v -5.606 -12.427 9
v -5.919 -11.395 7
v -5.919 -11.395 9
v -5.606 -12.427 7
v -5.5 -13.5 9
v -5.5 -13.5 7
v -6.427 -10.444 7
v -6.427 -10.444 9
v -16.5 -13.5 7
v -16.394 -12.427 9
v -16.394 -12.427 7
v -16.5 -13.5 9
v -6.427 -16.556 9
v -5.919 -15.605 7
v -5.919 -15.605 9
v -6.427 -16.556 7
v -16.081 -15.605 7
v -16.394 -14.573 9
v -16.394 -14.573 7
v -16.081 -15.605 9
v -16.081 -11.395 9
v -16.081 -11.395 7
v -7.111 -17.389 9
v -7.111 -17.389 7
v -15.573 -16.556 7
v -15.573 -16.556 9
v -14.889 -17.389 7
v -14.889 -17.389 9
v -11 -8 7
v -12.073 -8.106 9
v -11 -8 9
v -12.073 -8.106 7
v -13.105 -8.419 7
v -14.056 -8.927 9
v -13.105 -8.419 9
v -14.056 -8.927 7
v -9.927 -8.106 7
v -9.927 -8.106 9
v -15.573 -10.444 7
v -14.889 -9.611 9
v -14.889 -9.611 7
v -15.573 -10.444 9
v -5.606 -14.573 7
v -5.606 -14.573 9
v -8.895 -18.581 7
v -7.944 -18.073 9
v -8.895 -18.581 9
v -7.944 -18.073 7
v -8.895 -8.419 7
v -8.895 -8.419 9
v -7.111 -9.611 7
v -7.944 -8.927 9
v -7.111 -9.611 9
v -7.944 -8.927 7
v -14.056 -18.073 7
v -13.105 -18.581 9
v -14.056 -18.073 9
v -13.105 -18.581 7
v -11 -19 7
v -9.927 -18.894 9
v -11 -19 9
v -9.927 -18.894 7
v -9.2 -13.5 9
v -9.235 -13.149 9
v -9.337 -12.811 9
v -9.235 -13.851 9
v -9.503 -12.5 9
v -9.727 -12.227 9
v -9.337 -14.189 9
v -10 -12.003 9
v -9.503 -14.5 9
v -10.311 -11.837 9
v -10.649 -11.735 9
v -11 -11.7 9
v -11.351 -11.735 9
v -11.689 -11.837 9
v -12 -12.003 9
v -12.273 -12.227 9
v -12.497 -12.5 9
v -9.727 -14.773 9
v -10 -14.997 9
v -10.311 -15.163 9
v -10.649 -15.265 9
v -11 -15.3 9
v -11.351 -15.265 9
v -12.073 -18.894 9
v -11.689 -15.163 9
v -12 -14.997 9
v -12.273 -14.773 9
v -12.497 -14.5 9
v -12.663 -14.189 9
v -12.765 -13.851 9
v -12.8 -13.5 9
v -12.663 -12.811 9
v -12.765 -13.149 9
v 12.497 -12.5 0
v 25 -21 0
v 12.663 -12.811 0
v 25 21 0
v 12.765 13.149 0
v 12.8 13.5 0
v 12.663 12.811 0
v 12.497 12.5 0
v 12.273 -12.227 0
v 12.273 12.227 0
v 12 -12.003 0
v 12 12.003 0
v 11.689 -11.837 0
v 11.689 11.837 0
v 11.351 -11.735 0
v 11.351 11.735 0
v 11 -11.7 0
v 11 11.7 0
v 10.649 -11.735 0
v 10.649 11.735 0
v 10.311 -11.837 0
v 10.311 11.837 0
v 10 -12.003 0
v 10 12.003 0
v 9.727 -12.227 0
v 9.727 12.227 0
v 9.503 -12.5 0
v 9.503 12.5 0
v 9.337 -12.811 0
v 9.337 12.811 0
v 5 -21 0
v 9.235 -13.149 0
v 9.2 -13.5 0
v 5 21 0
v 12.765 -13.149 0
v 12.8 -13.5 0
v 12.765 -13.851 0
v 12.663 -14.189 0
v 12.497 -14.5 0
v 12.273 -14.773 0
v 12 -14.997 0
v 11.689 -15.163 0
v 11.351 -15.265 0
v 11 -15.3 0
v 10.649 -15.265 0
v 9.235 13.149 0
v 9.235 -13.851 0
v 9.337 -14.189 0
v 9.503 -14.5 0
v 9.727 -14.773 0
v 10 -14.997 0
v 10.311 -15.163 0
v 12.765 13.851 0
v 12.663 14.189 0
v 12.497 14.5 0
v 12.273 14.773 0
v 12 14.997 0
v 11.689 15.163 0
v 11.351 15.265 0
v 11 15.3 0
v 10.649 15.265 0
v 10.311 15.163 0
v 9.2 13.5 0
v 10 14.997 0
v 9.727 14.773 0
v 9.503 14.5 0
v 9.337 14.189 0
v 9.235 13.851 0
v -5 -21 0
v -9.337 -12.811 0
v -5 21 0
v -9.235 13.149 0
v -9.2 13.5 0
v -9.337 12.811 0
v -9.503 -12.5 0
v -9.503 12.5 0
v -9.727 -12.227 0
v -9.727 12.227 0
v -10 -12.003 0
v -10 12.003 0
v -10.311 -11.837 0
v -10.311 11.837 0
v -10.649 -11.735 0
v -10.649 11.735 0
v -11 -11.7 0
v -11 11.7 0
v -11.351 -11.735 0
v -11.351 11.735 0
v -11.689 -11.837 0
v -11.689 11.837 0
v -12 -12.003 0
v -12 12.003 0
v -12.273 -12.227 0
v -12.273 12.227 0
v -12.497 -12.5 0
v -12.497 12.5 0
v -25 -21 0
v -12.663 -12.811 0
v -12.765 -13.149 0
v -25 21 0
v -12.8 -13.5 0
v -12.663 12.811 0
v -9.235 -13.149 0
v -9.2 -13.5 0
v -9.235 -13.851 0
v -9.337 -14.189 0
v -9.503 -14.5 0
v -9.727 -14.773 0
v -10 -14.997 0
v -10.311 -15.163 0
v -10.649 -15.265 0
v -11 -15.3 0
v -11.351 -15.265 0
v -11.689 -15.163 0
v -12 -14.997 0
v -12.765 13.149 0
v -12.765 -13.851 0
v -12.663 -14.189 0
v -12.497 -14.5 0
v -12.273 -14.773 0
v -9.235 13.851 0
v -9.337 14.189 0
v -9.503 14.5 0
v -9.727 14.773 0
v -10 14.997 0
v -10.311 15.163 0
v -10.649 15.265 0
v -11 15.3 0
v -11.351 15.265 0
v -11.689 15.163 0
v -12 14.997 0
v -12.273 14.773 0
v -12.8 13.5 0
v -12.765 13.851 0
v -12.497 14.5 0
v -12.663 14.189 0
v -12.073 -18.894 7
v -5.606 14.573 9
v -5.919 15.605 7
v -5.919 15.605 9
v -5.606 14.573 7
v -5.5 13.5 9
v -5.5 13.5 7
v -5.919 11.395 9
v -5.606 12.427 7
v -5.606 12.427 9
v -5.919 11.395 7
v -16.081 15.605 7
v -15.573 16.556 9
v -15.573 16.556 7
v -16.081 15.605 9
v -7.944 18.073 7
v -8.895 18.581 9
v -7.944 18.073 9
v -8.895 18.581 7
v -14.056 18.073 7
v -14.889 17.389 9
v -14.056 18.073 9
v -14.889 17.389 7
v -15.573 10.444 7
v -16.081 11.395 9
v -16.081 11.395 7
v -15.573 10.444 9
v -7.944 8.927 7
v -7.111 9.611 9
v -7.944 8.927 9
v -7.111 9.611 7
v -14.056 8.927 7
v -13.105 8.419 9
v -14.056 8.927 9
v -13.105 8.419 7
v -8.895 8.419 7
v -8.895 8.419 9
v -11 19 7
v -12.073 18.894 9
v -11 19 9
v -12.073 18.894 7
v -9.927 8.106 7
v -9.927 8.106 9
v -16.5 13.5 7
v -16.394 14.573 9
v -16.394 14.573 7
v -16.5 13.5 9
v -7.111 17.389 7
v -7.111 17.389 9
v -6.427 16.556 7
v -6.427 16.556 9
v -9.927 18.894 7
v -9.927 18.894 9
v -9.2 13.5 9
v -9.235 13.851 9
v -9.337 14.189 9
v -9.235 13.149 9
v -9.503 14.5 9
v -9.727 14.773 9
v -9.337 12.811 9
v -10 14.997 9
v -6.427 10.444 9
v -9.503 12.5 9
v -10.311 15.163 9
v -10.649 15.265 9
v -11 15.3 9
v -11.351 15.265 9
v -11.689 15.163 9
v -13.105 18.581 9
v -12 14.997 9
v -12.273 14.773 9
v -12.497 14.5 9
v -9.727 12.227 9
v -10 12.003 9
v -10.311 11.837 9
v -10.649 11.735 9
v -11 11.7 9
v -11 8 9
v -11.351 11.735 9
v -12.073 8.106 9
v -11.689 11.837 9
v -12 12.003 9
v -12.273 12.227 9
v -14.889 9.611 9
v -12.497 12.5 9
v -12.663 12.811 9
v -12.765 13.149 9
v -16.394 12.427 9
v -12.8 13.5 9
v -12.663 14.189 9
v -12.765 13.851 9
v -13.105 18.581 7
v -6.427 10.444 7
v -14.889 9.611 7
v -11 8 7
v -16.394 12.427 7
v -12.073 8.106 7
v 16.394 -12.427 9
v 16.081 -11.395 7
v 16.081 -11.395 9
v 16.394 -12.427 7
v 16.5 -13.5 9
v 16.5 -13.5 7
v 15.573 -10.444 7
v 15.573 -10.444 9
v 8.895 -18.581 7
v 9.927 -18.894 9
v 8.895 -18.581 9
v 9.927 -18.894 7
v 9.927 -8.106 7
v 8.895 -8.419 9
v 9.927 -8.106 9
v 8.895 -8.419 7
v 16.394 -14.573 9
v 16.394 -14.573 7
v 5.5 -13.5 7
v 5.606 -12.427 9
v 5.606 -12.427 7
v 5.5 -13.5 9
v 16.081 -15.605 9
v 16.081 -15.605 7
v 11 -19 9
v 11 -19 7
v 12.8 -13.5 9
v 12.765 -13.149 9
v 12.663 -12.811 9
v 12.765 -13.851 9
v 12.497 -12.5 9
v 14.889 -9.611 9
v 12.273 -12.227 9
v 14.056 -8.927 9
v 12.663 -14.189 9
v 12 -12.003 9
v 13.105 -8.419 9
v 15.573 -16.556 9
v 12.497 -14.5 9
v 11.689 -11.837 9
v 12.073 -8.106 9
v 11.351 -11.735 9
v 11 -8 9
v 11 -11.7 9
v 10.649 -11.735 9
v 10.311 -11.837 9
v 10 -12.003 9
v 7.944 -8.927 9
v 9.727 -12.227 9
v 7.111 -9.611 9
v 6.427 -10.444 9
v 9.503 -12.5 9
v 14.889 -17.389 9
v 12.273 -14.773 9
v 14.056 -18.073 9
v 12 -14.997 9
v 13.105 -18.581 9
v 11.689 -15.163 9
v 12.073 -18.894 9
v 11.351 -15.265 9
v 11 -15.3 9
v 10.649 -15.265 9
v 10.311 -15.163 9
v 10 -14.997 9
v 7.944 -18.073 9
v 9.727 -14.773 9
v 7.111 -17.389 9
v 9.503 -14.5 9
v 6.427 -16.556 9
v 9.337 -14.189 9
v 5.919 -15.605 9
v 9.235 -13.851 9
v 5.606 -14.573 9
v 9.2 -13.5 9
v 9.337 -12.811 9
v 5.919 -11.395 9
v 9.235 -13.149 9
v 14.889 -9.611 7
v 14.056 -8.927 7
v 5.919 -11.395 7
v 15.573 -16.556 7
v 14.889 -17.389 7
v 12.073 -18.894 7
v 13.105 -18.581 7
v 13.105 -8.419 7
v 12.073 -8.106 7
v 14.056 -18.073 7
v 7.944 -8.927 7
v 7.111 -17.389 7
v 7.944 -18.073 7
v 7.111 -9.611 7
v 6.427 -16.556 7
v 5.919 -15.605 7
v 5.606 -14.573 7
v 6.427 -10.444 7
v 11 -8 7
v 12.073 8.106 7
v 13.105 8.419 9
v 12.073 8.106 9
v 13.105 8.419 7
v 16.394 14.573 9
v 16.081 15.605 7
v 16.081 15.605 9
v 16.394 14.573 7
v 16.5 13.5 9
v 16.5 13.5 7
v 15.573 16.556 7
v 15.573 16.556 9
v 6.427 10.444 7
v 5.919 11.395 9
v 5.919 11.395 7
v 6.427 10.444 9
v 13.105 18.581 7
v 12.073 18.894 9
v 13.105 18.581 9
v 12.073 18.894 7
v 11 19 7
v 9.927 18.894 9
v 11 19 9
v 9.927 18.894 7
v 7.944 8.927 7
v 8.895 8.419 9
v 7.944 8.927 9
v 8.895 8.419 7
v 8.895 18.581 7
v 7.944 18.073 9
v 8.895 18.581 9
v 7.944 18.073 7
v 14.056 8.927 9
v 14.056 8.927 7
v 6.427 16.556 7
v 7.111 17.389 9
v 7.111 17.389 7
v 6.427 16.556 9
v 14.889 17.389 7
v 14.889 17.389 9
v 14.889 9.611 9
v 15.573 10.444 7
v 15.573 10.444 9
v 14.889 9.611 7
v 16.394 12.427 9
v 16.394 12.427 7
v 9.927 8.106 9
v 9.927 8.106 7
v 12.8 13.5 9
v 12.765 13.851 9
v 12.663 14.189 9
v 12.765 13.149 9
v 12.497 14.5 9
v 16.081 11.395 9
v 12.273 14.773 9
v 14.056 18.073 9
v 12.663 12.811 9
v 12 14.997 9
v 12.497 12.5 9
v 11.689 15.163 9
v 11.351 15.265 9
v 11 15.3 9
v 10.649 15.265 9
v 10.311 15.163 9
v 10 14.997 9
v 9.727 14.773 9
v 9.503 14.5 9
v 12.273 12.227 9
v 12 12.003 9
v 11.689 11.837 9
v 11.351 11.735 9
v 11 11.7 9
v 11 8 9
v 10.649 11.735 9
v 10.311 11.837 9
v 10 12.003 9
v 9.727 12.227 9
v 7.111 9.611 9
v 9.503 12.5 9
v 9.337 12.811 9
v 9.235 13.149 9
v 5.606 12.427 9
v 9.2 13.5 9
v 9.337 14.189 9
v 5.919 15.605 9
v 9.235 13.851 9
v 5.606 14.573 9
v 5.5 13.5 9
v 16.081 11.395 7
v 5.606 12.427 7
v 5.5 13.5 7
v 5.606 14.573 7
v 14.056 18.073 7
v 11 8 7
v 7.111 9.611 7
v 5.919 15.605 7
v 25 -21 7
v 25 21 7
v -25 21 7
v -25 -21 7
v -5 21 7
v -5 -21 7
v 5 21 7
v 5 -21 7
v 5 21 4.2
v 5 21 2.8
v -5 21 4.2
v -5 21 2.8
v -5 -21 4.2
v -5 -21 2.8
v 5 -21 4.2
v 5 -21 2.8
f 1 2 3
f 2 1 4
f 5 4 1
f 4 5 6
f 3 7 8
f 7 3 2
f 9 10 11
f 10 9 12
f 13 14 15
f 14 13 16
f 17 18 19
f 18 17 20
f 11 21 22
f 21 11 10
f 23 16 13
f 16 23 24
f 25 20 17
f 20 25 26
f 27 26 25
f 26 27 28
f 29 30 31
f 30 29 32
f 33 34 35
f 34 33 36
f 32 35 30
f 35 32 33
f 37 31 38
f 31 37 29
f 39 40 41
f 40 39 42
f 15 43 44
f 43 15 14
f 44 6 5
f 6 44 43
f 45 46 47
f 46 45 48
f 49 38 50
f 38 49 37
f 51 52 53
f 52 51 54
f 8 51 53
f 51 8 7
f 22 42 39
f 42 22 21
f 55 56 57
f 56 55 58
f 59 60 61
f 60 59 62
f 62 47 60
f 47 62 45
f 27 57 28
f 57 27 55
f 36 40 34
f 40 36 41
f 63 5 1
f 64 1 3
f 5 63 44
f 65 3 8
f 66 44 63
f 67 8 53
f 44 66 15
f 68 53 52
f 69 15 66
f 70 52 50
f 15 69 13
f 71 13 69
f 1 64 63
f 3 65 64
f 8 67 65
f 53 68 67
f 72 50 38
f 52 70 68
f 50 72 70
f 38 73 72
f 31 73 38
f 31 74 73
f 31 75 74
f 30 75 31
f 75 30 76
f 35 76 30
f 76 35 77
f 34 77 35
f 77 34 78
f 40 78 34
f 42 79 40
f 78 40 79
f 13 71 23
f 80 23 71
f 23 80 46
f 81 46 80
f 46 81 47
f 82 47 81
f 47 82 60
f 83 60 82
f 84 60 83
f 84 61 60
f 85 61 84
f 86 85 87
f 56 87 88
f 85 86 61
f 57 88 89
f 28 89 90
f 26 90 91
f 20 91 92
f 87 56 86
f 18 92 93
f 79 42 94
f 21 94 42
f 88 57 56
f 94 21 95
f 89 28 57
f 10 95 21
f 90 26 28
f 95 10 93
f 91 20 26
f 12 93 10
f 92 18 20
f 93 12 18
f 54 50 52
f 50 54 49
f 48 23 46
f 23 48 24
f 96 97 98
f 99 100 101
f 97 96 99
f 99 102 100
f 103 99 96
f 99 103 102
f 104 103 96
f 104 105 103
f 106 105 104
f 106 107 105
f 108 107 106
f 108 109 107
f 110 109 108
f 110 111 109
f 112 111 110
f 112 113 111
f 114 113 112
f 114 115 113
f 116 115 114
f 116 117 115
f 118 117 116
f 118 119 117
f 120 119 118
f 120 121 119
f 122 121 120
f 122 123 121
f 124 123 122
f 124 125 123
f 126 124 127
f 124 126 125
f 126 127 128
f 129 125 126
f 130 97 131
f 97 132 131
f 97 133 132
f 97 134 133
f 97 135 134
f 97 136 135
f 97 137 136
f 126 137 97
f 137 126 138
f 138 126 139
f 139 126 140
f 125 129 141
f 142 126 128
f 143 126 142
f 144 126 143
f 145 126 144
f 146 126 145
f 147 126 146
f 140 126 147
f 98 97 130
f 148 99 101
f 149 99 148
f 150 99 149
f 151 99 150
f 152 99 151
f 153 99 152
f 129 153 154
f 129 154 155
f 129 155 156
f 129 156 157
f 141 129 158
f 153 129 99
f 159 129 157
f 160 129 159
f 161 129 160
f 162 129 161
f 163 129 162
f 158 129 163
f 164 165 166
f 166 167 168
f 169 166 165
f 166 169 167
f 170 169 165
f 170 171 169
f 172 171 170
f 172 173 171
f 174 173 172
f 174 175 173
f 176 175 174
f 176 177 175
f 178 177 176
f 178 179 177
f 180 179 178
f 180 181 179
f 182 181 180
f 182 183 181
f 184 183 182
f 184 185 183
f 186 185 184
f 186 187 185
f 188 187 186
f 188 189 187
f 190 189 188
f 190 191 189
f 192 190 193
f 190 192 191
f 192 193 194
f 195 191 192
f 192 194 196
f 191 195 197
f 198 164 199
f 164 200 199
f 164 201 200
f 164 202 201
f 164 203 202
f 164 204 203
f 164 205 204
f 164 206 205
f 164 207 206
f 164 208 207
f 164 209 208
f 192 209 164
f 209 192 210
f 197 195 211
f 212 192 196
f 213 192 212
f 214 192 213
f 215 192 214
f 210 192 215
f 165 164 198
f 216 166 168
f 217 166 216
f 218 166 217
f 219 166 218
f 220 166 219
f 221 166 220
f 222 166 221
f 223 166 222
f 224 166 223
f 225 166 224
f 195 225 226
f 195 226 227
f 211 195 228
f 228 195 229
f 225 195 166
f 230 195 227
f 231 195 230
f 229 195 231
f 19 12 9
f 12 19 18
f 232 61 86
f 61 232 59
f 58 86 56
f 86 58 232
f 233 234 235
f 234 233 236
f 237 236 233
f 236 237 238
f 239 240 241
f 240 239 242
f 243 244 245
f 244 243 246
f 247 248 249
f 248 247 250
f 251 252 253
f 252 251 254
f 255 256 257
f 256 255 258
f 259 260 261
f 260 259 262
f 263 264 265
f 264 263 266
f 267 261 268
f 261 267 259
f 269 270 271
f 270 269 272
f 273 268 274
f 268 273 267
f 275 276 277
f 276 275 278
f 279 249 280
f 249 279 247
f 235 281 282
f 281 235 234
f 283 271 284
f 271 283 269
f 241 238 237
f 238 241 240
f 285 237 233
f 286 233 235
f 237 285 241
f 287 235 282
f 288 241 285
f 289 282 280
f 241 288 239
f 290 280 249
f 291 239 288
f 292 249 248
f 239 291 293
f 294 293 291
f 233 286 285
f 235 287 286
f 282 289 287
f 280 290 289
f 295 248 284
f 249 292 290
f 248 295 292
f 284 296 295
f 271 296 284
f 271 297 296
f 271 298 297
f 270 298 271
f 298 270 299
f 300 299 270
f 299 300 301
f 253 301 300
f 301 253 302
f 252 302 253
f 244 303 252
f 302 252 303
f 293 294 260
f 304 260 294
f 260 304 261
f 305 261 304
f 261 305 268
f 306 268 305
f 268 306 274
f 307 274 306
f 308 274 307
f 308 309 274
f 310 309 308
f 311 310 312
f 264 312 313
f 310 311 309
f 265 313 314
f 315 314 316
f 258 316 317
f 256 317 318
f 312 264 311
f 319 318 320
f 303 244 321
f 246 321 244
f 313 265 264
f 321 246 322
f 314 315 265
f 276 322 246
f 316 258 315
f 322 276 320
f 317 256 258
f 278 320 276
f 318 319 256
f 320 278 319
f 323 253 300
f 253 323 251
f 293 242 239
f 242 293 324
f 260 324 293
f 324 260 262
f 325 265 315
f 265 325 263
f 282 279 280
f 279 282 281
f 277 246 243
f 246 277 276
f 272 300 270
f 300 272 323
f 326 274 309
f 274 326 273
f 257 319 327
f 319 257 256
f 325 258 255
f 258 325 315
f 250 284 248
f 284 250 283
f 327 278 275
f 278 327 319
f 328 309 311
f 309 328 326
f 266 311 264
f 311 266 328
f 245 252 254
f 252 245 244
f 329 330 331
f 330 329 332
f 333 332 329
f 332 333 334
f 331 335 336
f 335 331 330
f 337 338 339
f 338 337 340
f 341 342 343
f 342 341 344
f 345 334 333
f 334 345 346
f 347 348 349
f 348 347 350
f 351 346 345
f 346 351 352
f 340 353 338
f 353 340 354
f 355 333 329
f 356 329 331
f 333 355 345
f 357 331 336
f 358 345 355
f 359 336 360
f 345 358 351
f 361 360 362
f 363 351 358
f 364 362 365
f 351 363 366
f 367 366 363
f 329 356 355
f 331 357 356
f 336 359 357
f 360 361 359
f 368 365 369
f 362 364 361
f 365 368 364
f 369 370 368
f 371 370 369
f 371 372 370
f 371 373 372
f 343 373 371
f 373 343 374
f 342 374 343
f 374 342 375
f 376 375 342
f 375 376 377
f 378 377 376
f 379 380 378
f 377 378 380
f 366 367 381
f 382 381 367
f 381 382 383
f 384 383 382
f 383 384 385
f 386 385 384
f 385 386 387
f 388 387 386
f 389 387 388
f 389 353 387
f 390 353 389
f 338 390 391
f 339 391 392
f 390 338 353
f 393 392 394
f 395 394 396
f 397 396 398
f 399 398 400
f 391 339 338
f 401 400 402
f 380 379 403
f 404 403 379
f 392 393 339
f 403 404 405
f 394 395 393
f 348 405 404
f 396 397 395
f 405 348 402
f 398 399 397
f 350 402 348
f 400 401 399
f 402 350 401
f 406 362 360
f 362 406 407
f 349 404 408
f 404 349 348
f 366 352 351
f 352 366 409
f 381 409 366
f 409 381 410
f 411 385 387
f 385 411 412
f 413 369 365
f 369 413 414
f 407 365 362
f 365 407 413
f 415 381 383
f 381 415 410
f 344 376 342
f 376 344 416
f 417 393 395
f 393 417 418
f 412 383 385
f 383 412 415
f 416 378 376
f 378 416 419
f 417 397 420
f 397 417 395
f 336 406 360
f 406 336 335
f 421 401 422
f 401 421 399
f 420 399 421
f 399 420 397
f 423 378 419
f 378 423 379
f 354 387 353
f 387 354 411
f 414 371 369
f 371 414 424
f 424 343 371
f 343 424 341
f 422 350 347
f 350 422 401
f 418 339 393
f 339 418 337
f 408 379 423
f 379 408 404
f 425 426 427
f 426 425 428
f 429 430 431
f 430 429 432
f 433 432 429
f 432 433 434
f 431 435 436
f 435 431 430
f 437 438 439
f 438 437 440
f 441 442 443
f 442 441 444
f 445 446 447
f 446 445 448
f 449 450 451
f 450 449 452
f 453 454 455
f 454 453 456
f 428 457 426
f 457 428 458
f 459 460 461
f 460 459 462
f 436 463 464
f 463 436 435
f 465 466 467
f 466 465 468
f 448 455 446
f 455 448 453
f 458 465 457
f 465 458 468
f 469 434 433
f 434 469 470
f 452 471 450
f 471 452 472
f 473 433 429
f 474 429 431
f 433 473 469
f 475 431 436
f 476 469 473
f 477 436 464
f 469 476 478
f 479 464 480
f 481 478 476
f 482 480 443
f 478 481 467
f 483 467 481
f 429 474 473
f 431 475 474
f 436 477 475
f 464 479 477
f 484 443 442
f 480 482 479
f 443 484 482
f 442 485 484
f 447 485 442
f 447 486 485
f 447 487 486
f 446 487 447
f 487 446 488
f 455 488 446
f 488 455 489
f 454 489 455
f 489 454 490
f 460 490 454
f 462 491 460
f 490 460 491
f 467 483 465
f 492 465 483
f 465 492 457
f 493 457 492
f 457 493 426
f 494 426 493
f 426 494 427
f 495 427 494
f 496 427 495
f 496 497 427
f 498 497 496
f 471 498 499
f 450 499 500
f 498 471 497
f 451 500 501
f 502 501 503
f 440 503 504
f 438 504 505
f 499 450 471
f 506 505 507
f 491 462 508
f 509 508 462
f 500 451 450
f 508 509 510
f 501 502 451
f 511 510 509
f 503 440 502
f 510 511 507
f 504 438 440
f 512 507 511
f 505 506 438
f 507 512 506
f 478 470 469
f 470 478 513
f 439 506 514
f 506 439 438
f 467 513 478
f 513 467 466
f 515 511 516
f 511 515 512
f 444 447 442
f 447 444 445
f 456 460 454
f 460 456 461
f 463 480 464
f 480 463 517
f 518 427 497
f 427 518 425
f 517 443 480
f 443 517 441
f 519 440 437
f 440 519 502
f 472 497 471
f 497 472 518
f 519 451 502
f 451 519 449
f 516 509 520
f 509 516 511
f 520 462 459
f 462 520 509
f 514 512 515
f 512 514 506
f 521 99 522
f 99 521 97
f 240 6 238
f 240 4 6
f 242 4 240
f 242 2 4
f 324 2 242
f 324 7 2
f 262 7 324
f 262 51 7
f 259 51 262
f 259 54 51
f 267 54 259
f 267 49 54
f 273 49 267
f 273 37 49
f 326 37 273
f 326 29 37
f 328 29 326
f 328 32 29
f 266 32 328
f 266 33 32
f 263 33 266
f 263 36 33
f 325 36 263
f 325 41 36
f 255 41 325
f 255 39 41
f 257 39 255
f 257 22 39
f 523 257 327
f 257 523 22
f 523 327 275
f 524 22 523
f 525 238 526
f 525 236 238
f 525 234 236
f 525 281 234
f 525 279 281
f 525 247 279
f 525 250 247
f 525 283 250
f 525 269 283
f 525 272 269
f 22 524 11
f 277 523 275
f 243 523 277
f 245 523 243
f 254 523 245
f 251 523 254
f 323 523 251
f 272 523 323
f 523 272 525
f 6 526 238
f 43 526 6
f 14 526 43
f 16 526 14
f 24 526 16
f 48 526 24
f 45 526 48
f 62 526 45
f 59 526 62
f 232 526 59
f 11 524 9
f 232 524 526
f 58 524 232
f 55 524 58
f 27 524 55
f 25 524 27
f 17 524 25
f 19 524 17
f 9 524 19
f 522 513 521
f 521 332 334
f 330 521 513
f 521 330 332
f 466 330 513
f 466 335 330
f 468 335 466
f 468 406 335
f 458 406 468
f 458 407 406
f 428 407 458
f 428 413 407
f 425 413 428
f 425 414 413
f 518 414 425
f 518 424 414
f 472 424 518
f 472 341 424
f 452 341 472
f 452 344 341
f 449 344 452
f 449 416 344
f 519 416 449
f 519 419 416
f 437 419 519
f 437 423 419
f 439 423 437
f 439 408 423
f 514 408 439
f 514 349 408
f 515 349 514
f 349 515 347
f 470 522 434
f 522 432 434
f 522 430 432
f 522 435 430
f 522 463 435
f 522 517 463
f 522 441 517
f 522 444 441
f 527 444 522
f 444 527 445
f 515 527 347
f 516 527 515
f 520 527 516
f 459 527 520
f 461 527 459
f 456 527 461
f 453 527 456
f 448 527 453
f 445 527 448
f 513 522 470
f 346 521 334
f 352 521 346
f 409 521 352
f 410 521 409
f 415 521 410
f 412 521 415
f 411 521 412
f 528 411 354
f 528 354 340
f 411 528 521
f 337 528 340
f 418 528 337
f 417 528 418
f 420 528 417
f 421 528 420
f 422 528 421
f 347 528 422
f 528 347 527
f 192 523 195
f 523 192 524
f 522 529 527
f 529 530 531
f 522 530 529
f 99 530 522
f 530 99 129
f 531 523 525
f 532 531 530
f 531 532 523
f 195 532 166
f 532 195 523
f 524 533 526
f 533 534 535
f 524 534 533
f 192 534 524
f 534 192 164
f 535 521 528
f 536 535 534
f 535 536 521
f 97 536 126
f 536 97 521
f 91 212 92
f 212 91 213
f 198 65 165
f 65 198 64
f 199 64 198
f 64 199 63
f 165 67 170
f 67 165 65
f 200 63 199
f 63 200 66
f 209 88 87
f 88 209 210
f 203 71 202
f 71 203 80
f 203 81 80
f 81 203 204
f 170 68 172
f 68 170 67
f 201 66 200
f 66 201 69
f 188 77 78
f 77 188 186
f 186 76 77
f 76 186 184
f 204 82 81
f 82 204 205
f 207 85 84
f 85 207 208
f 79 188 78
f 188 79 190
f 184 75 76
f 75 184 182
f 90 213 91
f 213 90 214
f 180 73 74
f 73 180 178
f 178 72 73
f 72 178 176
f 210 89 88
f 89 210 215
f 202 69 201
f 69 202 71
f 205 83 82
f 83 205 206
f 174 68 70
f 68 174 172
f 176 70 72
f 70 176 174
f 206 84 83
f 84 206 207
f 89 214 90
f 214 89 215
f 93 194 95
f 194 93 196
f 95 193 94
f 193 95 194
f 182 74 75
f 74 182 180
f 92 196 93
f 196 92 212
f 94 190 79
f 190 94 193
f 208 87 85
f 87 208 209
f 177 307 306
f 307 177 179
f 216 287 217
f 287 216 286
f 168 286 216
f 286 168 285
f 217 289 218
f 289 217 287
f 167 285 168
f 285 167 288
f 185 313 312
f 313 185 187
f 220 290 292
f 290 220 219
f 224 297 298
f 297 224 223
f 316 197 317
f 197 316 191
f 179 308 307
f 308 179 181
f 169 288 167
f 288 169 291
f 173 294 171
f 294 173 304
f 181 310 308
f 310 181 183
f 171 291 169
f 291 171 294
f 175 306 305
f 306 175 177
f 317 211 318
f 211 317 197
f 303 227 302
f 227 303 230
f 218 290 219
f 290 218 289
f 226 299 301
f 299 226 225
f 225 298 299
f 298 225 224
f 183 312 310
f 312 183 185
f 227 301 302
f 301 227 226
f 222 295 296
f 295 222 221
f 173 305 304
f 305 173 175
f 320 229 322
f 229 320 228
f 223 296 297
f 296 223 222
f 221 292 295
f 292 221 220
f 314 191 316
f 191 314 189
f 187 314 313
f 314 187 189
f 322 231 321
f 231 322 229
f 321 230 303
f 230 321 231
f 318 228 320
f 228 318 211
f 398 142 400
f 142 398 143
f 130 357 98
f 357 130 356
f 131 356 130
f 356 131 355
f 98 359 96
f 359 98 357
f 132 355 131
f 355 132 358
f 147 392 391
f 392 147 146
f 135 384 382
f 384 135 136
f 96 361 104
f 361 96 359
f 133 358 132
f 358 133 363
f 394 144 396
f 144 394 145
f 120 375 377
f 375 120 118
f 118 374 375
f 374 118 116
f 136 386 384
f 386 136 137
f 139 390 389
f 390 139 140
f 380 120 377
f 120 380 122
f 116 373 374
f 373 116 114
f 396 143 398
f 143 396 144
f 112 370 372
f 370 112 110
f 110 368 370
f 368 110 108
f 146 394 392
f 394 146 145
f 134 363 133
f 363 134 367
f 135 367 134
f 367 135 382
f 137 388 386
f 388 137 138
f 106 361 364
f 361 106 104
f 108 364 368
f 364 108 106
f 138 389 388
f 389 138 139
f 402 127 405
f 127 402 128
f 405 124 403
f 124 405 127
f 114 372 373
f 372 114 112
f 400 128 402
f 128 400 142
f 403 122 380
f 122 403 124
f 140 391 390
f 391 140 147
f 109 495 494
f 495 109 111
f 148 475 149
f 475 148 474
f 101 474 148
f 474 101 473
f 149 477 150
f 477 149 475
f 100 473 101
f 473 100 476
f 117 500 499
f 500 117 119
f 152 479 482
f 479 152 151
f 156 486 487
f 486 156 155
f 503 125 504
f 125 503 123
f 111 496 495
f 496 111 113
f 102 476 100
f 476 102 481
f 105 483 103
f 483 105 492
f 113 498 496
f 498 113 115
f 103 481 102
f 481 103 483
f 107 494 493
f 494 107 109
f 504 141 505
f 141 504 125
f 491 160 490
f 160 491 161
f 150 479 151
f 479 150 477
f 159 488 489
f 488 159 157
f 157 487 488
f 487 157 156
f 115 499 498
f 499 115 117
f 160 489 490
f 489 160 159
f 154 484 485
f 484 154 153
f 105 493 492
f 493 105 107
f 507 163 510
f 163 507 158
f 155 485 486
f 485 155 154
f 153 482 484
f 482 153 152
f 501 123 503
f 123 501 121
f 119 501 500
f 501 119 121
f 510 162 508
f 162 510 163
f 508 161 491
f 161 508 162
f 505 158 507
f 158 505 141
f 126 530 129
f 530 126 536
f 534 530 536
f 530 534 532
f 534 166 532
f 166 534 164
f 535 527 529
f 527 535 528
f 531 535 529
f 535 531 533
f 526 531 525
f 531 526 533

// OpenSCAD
$fn = 32;

// ----------------------------------------------------------------------
// Living hinge: 50 x 42 mm plates, 1.4 mm flexible web
// ----------------------------------------------------------------------

// --- parameters (mm) ---
plate_len = 20;           // plate length outside the web
plate_w = 42;             // plate width
thick = 7;                // plate thickness
web_half = 5;             // half width of the flex band
web_t = 1.4;              // flexible web thickness
web_z = 2.8;              // web position inside the thickness
boss_d = 11;              // screw boss diameter
boss_h = 9;               // screw boss height
boss_x = 11;              // screw boss distance from the web
screw_d = 3.6;            // screw hole

difference() {
  union() {
    /* one flat strip, later thinned at the middle */
    translate([-25, -21, 0]) cube([50, 42, 7]);
    /* screw bosses, sunk 0.5 mm into the plates */
    for (sx = [-11, 11]) {
      for (sy = [-13.5, 13.5]) {
        translate([sx, sy, 0]) cylinder(h = boss_h, d = boss_d);
      }
    }
  }
  /* channel from below: leaves the web on top of it */
  translate([-5, -23.5, -2.5]) cube([10, 47, 5.3]);
  /* channel from above: thins the web down to web_t */
  translate([-5, -23.5, 4.2]) cube([10, 47, 5.3]);
  /* screw holes through the bosses */
  for (sx = [-11, 11]) {
    for (sy = [-13.5, 13.5]) {
      translate([sx, sy, -2.5]) cylinder(h = boss_h + 5, d = screw_d);
    }
  }
}
